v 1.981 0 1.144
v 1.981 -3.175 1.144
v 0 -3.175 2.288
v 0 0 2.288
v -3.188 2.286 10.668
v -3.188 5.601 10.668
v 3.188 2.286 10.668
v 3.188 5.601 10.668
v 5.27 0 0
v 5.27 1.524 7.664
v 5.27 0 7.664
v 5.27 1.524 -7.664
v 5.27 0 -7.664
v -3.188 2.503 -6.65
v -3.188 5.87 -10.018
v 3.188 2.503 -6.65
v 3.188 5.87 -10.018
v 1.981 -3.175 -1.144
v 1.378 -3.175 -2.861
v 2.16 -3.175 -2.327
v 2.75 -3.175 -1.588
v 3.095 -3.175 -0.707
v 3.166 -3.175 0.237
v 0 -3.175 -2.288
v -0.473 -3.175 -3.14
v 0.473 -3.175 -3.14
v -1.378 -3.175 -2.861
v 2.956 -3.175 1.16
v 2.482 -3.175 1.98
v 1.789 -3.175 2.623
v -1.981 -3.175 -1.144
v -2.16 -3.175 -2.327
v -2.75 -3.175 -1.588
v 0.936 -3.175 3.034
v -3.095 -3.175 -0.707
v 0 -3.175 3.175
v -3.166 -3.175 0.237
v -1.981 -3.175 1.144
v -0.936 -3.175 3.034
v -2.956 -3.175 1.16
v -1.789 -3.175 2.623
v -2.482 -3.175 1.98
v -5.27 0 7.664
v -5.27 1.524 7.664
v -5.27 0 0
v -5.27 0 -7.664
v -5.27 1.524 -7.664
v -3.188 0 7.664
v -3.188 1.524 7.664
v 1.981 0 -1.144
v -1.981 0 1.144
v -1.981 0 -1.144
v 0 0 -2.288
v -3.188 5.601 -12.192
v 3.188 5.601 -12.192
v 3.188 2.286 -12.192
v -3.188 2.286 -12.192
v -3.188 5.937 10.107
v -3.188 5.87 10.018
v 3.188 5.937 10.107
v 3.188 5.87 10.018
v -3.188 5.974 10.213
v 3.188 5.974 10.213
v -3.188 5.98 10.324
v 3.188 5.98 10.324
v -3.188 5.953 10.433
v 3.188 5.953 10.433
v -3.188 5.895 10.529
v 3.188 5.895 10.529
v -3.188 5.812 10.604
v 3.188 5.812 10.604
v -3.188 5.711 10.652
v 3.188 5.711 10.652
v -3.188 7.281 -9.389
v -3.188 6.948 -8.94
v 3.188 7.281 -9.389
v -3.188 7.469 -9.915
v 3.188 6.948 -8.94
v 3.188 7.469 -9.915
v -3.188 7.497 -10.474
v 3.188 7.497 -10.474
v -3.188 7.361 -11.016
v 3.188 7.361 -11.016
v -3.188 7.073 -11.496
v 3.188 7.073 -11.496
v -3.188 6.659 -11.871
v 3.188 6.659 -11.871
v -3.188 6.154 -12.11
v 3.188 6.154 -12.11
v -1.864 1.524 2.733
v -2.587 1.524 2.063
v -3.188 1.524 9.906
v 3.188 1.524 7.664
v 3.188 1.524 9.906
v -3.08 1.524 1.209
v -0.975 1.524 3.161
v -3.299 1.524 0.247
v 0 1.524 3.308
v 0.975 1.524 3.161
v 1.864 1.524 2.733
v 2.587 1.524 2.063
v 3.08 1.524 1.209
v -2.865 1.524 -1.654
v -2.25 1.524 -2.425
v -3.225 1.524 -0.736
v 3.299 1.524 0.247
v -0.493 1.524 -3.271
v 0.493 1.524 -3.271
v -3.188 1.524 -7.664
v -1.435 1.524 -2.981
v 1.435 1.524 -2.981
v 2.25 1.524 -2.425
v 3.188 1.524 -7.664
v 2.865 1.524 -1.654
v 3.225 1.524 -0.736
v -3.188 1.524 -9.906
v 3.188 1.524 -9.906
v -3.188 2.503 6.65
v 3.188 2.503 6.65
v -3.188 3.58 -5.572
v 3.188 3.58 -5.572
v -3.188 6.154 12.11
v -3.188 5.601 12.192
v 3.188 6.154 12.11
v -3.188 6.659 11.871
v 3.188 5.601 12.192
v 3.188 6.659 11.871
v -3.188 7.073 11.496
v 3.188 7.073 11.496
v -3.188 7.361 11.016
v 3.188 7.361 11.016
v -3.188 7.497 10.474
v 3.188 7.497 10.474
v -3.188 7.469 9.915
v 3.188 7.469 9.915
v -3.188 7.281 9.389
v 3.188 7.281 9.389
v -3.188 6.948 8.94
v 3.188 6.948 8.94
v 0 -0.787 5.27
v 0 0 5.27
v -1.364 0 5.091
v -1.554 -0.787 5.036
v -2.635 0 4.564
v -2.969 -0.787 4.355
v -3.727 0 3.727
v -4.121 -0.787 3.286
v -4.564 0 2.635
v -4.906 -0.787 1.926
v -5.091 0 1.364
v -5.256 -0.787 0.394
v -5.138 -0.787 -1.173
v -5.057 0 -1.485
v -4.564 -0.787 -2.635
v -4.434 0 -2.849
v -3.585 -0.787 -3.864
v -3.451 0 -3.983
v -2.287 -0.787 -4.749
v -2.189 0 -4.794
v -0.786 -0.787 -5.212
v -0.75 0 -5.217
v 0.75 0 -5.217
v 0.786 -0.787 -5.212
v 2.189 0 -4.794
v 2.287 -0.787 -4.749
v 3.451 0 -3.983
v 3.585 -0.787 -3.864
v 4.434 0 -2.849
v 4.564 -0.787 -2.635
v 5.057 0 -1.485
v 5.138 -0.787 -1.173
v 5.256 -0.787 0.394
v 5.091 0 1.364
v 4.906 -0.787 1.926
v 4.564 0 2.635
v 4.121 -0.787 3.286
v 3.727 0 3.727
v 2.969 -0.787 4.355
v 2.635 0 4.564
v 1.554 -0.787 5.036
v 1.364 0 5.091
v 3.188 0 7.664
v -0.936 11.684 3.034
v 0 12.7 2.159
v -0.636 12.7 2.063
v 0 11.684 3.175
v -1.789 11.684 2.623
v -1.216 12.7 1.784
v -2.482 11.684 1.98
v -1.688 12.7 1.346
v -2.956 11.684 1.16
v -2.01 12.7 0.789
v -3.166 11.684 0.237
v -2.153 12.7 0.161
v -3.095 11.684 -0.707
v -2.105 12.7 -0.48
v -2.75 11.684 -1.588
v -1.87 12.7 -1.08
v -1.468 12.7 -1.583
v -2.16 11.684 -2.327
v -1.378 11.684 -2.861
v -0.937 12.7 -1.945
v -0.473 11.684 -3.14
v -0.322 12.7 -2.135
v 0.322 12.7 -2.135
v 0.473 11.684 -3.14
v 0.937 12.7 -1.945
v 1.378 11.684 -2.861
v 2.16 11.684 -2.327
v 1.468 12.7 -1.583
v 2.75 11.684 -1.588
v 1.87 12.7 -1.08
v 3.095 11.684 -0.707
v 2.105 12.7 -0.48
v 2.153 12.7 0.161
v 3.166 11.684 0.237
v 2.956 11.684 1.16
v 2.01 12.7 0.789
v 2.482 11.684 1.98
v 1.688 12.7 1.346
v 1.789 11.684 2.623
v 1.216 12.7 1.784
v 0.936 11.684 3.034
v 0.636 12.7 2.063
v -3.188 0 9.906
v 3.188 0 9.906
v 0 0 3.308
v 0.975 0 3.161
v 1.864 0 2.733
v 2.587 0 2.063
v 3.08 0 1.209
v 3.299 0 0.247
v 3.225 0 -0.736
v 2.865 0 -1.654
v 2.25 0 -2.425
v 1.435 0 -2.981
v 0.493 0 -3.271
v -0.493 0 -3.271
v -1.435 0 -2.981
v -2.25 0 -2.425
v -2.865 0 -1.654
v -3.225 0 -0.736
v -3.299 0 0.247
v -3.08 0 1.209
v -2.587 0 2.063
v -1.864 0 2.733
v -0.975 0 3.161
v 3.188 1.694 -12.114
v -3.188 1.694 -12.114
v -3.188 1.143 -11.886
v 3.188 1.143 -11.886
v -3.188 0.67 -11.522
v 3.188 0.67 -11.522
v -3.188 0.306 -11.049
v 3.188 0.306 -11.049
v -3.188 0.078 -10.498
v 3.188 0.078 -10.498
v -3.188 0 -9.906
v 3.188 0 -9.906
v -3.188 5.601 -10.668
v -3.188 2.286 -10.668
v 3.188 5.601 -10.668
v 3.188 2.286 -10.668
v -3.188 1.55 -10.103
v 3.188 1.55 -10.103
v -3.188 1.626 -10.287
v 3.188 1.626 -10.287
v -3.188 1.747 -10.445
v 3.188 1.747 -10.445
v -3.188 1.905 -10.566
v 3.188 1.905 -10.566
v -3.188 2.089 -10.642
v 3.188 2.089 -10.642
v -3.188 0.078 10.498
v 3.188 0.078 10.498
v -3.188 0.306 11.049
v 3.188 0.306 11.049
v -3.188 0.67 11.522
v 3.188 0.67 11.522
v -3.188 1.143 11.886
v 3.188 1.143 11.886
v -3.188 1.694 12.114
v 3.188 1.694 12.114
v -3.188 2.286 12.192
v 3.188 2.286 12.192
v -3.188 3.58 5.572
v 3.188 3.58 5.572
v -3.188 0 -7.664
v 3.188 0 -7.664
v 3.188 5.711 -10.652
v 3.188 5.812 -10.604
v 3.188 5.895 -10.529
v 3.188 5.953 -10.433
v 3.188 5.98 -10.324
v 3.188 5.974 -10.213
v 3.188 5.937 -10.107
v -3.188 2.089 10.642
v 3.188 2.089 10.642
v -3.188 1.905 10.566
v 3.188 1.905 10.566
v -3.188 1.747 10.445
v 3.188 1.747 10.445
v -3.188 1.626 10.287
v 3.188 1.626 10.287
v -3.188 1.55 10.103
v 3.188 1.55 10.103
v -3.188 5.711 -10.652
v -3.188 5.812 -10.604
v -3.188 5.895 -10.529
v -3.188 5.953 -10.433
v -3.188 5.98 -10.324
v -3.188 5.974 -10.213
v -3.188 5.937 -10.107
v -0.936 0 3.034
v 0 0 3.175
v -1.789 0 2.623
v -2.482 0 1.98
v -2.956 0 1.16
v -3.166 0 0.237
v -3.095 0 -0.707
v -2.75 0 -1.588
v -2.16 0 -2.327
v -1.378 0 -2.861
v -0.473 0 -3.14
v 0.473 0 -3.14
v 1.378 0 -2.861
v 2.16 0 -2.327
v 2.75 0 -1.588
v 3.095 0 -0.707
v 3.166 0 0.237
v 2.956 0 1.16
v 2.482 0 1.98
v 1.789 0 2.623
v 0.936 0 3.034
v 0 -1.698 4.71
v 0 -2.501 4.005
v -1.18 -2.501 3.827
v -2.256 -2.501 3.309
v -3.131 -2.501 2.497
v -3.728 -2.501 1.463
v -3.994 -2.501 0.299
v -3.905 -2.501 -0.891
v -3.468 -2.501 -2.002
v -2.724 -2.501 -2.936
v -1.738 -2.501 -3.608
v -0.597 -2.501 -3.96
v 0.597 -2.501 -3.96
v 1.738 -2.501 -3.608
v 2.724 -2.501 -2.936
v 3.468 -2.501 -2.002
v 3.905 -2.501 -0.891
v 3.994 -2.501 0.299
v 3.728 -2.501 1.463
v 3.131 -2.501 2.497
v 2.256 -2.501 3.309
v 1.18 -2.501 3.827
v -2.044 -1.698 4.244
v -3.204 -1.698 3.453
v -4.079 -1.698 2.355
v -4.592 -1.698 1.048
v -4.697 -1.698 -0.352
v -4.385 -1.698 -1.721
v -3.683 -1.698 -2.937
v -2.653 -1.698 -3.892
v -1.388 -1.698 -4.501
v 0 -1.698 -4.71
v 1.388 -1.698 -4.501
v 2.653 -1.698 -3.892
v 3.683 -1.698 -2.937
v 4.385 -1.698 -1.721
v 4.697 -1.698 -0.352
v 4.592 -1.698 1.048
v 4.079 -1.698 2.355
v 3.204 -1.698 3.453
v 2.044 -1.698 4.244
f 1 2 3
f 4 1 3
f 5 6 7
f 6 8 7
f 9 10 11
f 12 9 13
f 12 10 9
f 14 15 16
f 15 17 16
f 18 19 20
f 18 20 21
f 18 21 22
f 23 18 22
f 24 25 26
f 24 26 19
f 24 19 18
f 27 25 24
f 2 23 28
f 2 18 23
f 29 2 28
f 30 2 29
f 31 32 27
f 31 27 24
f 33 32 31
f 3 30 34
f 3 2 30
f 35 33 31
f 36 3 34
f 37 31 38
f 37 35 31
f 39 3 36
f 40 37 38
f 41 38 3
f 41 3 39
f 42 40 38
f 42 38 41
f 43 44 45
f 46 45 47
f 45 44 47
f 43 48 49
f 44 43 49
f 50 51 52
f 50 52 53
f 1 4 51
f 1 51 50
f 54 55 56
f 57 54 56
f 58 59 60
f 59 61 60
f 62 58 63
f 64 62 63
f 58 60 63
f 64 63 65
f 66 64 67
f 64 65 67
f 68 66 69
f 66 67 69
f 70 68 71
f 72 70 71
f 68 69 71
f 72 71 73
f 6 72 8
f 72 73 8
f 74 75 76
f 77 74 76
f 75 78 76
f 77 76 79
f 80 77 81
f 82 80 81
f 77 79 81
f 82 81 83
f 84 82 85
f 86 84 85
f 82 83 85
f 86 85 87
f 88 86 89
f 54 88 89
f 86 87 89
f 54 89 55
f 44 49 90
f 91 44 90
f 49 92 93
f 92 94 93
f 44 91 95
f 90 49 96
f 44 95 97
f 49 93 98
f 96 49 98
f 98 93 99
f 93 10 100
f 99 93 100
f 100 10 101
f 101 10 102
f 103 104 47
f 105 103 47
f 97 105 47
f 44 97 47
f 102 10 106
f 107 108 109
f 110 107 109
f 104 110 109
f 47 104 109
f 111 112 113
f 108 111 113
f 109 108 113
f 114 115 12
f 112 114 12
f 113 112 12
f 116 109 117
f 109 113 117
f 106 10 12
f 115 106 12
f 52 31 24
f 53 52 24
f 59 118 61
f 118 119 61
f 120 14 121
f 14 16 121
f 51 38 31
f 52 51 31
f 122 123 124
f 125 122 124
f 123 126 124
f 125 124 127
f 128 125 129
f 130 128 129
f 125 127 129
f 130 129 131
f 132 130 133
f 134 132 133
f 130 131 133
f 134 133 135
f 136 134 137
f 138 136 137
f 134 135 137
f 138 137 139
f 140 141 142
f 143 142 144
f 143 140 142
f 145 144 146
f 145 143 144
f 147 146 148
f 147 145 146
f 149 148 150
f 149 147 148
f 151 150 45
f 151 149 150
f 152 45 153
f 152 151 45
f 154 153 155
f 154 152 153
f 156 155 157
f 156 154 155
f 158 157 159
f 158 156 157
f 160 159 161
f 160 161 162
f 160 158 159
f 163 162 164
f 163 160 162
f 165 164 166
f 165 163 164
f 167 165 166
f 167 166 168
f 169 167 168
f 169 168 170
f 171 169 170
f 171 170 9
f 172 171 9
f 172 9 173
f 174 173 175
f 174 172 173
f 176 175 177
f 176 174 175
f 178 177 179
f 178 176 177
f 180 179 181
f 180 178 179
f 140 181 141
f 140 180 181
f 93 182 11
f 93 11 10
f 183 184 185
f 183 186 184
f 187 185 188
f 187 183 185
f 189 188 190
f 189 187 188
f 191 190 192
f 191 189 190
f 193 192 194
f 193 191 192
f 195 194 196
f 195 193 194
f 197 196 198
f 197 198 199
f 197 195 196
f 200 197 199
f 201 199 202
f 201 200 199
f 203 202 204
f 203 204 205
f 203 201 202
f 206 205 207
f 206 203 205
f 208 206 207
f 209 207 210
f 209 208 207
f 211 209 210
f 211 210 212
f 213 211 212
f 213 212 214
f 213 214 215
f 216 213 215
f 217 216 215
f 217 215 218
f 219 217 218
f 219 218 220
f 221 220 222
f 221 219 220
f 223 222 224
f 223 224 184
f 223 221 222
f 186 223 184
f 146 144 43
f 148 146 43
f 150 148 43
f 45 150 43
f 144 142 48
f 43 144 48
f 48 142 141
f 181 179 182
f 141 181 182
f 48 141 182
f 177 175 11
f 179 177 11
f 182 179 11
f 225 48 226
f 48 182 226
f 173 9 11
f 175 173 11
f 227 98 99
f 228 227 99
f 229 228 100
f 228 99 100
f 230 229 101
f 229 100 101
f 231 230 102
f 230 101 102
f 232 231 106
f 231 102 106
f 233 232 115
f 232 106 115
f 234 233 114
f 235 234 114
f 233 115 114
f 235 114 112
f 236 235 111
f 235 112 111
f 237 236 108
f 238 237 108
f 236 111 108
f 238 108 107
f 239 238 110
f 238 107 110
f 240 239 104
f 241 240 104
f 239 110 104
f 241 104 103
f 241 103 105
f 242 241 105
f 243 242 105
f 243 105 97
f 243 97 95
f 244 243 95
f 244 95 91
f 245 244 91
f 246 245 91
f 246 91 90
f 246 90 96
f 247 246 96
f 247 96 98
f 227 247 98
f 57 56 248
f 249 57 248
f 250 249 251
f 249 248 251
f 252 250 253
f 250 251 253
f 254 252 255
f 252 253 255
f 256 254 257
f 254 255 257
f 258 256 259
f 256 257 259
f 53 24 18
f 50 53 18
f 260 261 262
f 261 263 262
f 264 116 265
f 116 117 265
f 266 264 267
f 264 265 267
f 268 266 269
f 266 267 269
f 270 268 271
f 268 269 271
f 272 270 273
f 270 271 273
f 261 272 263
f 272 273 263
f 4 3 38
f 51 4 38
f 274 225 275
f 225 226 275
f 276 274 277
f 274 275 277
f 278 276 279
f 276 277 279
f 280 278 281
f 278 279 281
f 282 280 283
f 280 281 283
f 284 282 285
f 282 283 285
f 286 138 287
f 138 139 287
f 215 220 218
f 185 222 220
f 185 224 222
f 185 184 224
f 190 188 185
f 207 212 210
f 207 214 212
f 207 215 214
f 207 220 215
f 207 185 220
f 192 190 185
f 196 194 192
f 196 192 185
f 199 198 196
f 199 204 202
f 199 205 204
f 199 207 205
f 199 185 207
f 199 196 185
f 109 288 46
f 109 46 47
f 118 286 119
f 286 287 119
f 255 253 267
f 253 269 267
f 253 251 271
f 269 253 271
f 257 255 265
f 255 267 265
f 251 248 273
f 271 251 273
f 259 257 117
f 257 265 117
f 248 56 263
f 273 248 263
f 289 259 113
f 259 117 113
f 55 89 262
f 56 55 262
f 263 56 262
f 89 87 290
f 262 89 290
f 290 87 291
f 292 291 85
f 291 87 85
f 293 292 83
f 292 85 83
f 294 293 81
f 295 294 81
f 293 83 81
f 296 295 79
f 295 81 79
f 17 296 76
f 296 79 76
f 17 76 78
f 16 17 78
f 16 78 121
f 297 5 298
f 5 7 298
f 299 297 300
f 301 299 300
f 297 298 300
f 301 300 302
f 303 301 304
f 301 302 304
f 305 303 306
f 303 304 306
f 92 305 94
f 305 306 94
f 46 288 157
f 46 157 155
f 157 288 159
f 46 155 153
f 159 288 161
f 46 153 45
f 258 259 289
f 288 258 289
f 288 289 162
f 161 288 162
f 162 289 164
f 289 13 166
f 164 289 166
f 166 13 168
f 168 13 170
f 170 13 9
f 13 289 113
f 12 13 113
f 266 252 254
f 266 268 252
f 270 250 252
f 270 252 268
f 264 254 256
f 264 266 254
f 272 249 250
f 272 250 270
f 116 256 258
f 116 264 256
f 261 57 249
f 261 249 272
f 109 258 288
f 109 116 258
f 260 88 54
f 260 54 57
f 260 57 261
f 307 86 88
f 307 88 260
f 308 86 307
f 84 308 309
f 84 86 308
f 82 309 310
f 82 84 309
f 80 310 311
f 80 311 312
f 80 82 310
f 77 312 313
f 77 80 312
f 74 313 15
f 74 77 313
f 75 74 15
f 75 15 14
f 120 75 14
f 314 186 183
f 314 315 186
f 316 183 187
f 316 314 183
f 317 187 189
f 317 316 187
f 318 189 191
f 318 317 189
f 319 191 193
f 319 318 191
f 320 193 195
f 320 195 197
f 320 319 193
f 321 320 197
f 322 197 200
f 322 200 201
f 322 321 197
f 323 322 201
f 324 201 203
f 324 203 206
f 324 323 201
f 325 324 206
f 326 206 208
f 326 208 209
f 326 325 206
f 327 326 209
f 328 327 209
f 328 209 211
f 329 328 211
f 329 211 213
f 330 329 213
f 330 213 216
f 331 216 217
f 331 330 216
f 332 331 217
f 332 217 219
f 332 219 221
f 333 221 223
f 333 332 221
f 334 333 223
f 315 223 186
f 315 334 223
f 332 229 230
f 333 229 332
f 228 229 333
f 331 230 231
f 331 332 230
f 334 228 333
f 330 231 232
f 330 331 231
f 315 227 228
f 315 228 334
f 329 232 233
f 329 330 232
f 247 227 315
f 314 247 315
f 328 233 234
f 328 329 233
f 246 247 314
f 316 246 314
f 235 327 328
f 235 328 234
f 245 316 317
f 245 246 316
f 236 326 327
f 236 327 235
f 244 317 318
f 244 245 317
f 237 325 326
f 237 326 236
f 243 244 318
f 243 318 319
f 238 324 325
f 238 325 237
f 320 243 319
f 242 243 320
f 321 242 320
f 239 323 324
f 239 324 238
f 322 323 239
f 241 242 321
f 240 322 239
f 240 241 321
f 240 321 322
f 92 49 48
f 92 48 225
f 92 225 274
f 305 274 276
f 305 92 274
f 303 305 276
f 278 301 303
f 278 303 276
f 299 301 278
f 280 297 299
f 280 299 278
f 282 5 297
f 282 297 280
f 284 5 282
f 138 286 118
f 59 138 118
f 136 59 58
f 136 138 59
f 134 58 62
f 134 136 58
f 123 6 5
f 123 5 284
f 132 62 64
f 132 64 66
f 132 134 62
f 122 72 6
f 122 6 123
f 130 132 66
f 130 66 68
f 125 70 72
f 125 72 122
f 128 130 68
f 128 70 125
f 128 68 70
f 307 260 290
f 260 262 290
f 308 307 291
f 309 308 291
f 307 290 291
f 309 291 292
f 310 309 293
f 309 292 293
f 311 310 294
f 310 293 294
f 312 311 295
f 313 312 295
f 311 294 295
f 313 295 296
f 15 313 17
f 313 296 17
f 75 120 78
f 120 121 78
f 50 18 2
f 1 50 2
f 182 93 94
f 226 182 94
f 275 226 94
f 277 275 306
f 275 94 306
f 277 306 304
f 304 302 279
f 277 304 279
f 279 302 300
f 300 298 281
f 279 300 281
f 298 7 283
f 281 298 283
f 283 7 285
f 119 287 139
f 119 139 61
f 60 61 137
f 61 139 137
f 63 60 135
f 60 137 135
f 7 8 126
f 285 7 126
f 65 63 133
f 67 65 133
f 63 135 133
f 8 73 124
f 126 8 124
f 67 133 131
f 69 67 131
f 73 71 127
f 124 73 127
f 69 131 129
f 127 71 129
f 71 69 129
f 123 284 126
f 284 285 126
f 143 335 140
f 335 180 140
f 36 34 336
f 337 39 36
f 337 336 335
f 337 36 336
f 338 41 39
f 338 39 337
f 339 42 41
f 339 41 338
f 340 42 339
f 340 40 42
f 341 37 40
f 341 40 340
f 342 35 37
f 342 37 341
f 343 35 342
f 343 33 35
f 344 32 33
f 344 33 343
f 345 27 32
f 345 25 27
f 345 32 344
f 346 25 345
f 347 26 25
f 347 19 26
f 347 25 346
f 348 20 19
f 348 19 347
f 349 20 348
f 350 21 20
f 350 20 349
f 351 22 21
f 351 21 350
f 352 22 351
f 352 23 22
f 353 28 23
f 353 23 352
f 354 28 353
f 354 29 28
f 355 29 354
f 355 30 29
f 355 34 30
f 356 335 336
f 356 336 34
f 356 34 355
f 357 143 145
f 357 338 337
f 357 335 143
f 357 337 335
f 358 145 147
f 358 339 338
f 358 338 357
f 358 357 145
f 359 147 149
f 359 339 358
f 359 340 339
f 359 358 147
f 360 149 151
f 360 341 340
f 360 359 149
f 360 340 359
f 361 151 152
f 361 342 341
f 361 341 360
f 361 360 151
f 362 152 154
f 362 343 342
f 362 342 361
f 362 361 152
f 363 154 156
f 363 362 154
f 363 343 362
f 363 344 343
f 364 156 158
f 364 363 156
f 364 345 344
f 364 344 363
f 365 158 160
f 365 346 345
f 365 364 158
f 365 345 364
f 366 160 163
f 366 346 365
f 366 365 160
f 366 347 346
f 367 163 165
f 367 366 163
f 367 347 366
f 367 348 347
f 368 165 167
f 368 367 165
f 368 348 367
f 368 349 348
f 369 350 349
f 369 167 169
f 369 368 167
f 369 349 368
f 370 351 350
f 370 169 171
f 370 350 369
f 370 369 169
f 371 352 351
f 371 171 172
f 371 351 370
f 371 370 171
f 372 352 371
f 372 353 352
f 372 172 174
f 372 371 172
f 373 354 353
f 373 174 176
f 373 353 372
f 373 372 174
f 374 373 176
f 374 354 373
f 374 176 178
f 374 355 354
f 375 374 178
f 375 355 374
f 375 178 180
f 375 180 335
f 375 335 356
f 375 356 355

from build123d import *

# Parameters (mm, degrees)
BOSS_EXTRUDE1_DEPTH = 3.1877
SKETCH2_W           = 15.3289
SKETCH2_H           = 1.524
BOSS_EXTRUDE2_DEPTH = 2.0828
SKETCH3_R           = 3.30835
CUT_EXTRUDE1_DEPTH  = 15.567215559
CUT_EXTRUDE2_DEPTH  = 3.175


with BuildPart() as part:
    # Sketch1 → Boss-Extrude1 (new, symmetric)
    with BuildSketch(Plane(origin=(0, 0, 0), x_dir=(0, 0, -1), z_dir=(1, 0, 0))):
        with BuildLine():
            Line((9.906, 0), (-9.906, 0))
            ThreePointArc((-9.906, 0), (-11.522446102, 0.669553898), (-12.192, 2.286))
            Line((-12.192, 2.286), (-12.192, 5.6007))
            ThreePointArc((-12.192, 5.6007), (-11.016011939, 7.360690509), (-8.939961582, 6.947738418))
            Line((-8.939961582, 6.947738418), (-5.572365536, 3.580142373))
            Line((-5.572365536, 3.580142373), (-6.649996271, 2.502511638))
            Line((-6.649996271, 2.502511638), (-10.017592316, 5.870107684))
            ThreePointArc((-10.017592316, 5.870107684), (-10.432802388, 5.952698102), (-10.668, 5.6007))
            Line((-10.668, 5.6007), (-10.668, 2.286))
            ThreePointArc((-10.668, 2.286), (-10.444815367, 1.747184633), (-9.906, 1.524))
            Line((-9.906, 1.524), (9.906, 1.524))
            ThreePointArc((9.906, 1.524), (10.444815367, 1.747184633), (10.668, 2.286))
            Line((10.668, 2.286), (10.668, 5.6007))
            ThreePointArc((10.668, 5.6007), (10.432802388, 5.952698102), (10.017592316, 5.870107684))
            Line((10.017592316, 5.870107684), (6.649996271, 2.502511638))
            Line((6.649996271, 2.502511638), (5.572365536, 3.580142373))
            Line((5.572365536, 3.580142373), (8.939961582, 6.947738418))
            ThreePointArc((8.939961582, 6.947738418), (11.016011939, 7.360690509), (12.192, 5.6007))
            Line((12.192, 5.6007), (12.192, 2.286))
            ThreePointArc((12.192, 2.286), (11.522446102, 0.669553898), (9.906, 0))
        make_face()
    extrude(amount=BOSS_EXTRUDE1_DEPTH, both=True)

    # Sketch2 → Boss-Extrude2 (add)
    with BuildSketch(Plane(origin=(3.1877, 0, 0), x_dir=(0, 0, -1), z_dir=(1, 0, 0))):
        with Locations((0, 0.762)):
            Rectangle(SKETCH2_W, SKETCH2_H)
    boss_extrude2 = extrude(amount=BOSS_EXTRUDE2_DEPTH)

    # Mirror1: Boss-Extrude2 across plane
    add(boss_extrude2.mirror(Plane(origin=(0, 0, 0), x_dir=(0, 0, 1), z_dir=(1, 0, 0))))

    # Sketch3 → Cut-Extrude1 (cut, through all)
    with BuildSketch(Plane(origin=(0, 1.524, 0), x_dir=(1, 0, 0), z_dir=(0, 1, 0))):
        with Locations(Location((0, 0, 0), (0, 0, 270))):
            Circle(SKETCH3_R)
    extrude(amount=-CUT_EXTRUDE1_DEPTH, mode=Mode.SUBTRACT)

    # Sketch4 → Revolve1 (revolve)
    with BuildSketch(Plane(origin=(0, 0, 0), x_dir=(0, 0, -1), z_dir=(1, 0, 0)), mode=Mode.PRIVATE) as revolve1_sk:
        with BuildLine():
            Line((3.175, 0), (5.2705, 0))
            Line((5.2705, 0), (5.2705, -0.7874))
            ThreePointArc((5.2705, -0.7874), (4.374468906, -2.11435755), (3.175, -3.175))
            Line((3.175, -3.175), (0, -3.175))
            Line((0, -3.175), (0, 12.7))
            Line((0, 12.7), (2.159, 12.7))
            Line((2.159, 12.7), (3.175, 11.684))
            Line((3.175, 11.684), (3.175, 0))
        make_face()
    revolve(revolve1_sk.sketch.rotate(Axis((0, 19.260698501, 0), (0, -1, 0)), 180), axis=Axis((0, 19.260698501, 0), (0, -1, 0)))

    # Sketch5 → Cut-Extrude2 (cut)
    with BuildSketch(Plane.XZ.offset(3.175)):
        Polygon((0, 2.287692707), (-1.9812, 1.143846353), (-1.9812, -1.143846353), (0, -2.287692707), (1.9812, -1.143846353), (1.9812, 1.143846353), align=None)
    extrude(amount=-CUT_EXTRUDE2_DEPTH, mode=Mode.SUBTRACT)


solid = part.part
